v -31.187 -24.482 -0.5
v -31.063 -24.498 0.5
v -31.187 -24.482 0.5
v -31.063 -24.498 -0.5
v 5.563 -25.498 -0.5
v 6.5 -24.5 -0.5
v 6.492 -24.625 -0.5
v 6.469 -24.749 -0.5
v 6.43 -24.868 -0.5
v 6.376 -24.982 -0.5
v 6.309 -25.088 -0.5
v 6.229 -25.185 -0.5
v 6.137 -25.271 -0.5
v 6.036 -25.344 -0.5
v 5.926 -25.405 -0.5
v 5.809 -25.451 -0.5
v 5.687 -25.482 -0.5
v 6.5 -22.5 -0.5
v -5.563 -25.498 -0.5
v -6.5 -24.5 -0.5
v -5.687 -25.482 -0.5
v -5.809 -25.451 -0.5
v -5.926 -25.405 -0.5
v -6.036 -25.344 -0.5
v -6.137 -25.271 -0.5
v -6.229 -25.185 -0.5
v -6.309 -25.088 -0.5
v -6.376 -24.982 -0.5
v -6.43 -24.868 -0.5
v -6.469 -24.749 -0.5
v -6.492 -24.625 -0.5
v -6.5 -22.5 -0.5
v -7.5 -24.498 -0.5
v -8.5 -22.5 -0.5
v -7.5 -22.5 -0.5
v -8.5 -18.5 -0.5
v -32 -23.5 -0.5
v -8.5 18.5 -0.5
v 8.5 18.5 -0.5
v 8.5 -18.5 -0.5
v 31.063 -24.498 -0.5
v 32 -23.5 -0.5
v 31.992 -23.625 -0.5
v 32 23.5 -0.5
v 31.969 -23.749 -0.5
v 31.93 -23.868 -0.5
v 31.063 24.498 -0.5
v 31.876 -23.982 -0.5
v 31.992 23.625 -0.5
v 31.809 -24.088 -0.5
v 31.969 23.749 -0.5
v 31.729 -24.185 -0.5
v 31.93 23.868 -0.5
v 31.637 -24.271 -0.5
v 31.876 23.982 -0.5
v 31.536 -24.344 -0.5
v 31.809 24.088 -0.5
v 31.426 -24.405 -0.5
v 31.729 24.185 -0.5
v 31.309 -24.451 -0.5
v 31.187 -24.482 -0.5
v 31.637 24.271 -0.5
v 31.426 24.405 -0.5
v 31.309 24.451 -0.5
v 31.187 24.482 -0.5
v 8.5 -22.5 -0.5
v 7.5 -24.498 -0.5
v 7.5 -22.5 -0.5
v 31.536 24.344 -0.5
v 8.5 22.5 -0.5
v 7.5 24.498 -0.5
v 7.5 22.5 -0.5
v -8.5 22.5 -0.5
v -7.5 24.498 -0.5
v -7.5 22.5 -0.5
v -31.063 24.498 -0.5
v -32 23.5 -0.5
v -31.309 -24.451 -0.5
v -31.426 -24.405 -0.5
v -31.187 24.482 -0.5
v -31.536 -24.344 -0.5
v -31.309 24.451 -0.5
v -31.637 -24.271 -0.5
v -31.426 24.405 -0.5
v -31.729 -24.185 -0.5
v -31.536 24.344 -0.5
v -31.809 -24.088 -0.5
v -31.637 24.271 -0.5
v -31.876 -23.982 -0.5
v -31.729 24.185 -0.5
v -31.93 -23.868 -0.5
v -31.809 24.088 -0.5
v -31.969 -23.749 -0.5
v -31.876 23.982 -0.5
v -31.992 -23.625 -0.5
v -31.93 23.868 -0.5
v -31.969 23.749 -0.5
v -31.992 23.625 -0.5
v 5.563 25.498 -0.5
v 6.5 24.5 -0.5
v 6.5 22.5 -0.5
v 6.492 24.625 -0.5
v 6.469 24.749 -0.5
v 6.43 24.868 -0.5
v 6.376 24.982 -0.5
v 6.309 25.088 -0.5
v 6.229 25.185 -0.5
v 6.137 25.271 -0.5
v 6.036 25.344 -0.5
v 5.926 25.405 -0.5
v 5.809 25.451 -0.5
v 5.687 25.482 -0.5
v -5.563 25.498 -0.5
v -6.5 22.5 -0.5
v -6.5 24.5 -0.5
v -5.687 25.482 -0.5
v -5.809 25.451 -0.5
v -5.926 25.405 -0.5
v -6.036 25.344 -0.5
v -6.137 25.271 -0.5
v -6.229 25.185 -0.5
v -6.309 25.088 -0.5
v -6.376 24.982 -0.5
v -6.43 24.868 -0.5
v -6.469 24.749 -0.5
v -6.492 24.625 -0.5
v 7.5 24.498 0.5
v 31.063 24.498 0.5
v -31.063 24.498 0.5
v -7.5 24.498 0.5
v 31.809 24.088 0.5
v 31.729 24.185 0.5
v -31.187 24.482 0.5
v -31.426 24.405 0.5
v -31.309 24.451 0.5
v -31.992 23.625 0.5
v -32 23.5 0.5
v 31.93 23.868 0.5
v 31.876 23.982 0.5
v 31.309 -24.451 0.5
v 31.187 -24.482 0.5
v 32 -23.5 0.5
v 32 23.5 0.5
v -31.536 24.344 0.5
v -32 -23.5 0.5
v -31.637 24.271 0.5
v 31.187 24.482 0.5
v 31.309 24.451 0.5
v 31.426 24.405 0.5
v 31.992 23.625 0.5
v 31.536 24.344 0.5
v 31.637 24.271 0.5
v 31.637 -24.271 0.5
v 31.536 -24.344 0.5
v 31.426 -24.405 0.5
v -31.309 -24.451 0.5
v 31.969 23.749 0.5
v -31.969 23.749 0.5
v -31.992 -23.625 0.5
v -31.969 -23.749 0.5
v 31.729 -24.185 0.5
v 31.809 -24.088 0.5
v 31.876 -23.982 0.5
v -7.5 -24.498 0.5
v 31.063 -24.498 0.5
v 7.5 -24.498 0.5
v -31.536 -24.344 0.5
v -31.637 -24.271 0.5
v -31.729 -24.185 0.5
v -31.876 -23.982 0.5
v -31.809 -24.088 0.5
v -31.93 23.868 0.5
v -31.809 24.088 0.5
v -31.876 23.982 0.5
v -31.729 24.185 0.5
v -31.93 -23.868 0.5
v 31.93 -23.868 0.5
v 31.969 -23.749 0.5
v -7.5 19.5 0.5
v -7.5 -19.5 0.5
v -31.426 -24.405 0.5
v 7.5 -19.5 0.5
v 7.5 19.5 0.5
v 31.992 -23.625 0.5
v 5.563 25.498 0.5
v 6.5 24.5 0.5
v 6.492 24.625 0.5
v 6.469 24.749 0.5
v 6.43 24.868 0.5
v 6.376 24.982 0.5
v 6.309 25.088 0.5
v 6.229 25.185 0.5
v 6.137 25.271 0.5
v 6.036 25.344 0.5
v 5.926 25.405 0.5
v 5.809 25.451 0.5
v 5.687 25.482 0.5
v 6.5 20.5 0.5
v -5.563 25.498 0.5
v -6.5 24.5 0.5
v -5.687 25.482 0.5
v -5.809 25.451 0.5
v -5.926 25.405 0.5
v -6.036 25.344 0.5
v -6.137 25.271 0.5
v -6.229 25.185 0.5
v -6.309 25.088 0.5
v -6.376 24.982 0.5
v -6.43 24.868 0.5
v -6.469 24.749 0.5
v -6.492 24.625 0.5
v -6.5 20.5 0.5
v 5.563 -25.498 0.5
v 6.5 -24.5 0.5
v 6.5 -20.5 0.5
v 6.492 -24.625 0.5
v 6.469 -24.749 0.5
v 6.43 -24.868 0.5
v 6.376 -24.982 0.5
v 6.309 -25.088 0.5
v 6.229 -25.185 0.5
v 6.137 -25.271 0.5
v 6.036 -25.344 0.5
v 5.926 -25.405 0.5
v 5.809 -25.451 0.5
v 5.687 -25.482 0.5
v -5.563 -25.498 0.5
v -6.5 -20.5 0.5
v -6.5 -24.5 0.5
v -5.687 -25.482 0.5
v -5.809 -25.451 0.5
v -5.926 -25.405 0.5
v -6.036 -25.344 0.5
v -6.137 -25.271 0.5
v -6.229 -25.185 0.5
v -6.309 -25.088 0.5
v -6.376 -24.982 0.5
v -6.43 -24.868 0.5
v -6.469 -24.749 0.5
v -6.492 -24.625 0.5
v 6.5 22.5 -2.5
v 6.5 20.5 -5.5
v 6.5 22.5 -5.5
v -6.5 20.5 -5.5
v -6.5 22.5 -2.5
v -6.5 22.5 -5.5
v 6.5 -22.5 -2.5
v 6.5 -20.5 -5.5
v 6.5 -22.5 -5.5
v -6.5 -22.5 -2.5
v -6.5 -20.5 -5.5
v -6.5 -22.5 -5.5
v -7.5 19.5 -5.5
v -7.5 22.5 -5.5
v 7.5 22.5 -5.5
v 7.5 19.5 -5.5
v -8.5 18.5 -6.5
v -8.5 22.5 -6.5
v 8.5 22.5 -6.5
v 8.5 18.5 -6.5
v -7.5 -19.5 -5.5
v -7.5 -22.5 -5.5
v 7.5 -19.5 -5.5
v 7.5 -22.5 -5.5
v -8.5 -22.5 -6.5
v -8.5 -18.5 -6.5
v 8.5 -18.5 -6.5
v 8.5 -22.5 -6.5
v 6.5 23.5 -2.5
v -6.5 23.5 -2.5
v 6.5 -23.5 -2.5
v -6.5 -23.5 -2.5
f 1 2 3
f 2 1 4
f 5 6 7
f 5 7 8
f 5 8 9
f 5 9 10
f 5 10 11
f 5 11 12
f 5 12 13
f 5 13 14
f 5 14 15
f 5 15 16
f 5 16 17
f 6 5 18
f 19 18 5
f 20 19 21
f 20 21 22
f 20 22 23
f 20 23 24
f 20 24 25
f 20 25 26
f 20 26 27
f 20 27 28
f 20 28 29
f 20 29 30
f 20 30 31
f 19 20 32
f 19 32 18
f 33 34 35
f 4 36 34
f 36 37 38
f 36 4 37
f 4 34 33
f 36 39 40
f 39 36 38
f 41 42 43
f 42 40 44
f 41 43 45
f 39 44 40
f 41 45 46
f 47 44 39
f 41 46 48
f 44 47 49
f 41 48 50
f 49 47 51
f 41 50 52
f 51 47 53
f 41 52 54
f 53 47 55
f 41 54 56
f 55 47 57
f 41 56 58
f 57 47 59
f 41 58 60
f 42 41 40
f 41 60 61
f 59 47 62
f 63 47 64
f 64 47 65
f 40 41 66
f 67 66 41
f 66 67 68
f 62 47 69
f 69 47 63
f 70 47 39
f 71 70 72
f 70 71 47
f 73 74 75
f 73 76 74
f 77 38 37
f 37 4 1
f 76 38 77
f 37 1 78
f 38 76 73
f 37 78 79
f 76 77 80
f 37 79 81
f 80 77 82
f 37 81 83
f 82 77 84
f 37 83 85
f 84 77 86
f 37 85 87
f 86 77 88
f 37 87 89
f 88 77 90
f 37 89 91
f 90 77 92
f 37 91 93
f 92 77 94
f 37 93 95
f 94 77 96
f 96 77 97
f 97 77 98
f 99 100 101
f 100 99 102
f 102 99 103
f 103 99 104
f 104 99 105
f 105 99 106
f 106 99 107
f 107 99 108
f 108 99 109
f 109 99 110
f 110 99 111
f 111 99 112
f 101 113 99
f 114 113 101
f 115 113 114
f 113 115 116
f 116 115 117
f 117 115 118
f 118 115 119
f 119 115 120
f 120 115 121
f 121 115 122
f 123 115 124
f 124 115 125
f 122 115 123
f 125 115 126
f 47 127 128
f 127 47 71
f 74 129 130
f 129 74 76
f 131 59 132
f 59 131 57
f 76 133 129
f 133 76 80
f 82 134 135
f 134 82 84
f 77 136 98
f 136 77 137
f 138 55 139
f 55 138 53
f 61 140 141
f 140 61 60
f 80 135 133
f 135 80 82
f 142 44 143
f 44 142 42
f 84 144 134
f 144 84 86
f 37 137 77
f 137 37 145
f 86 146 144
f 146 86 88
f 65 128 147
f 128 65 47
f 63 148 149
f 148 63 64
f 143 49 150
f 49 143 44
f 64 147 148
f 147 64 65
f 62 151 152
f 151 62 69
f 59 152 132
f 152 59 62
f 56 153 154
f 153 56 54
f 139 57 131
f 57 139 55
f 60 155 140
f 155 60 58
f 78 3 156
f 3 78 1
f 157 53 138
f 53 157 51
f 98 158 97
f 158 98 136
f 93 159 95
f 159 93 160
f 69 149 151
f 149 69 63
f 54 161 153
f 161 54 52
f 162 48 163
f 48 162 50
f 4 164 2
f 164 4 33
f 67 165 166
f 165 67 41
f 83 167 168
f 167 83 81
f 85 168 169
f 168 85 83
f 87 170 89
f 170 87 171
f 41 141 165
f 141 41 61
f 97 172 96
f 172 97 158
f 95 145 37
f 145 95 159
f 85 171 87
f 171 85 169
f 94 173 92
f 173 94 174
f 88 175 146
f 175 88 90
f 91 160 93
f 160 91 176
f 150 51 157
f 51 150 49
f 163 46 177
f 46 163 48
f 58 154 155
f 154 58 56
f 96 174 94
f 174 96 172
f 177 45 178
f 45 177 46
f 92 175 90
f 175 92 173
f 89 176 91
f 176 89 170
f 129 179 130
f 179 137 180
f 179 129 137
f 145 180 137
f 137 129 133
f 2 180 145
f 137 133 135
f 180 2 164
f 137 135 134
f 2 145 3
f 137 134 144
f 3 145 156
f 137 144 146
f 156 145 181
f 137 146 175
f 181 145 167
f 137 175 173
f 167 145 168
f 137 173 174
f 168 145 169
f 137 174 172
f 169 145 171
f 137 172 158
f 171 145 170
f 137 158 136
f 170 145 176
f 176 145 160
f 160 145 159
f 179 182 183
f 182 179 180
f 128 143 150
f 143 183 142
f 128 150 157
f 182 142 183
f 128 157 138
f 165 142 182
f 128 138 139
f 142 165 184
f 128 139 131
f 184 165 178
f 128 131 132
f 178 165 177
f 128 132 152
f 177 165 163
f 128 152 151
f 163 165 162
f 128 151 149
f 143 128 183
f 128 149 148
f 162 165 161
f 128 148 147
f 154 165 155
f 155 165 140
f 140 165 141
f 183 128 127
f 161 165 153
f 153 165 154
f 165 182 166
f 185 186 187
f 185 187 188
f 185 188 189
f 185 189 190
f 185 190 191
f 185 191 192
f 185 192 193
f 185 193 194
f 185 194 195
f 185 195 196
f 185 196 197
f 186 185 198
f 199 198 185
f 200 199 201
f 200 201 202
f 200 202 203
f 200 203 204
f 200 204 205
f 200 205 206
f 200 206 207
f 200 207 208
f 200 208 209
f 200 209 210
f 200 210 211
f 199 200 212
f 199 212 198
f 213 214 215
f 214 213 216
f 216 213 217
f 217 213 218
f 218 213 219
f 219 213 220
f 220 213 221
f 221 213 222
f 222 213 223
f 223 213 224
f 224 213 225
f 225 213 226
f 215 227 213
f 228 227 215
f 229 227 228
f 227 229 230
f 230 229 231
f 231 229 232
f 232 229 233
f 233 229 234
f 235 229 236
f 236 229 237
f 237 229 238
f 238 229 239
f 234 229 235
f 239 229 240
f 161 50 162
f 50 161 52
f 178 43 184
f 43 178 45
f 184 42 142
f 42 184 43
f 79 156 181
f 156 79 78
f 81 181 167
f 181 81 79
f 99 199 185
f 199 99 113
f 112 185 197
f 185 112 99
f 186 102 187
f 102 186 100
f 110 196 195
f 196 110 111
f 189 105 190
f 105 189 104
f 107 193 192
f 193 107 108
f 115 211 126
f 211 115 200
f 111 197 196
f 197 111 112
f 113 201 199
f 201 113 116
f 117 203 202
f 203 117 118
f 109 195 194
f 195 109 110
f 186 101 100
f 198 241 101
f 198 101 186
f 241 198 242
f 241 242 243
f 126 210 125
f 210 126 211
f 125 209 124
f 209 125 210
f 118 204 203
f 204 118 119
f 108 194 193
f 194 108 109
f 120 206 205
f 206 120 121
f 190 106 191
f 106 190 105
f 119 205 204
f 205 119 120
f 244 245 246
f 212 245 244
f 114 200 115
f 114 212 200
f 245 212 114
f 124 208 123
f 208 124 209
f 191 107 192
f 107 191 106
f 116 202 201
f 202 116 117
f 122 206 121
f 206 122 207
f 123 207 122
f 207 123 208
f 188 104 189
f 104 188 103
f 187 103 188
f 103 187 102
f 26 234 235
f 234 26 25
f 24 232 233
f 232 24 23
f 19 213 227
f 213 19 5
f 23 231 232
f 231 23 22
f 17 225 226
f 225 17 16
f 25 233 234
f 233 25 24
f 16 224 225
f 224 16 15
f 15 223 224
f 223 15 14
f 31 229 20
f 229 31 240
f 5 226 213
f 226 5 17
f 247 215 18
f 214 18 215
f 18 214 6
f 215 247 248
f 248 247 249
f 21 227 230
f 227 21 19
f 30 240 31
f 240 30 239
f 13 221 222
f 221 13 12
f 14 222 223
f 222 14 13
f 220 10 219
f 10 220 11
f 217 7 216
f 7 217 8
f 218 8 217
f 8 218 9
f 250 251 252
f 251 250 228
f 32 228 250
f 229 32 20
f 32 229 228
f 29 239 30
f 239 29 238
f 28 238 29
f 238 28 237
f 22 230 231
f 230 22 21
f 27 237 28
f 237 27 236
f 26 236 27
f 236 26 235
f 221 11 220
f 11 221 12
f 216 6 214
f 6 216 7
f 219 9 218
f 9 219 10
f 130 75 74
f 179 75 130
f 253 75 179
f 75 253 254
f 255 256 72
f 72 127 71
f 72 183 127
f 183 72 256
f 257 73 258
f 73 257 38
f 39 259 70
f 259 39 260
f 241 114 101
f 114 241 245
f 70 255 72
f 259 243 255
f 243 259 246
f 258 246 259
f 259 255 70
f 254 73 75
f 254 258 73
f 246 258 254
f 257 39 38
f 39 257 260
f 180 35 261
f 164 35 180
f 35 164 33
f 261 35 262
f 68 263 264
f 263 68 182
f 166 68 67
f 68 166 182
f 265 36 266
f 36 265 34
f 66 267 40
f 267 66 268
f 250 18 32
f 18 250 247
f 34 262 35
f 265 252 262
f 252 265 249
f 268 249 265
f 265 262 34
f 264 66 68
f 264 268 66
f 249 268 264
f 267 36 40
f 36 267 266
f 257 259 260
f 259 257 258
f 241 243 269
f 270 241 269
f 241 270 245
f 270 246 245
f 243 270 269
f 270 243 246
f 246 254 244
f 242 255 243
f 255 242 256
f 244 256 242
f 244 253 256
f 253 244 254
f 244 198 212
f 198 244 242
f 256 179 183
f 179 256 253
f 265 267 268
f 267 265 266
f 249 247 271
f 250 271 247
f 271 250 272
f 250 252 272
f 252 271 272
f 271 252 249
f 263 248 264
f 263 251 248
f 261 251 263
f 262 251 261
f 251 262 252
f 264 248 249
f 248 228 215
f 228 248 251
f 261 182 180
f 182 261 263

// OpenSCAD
$fa = 0.5; // default minimum facet angle is now 0.5
$fs = 0.5; // default minimum facet size is now 0.5 
$fn = 50;

bay = [60,45];
lip = 2;
wall = 1;
box_wall = 1;

cap = [13, 4, 1];

module wedge(d = [1,1,1], center = false) {
    mov = center ? [-d[0]/2,-d[1]/2,0] : [0,0,d[2]]/2;
    
    translate(mov)
    linear_extrude(height = d[2], center=true)
    polygon([[0,0],[d[0],0],[0,d[1]]]);
}

module rounded_cube(d=[1,1,1], center = false, r = 1) {
    mov = center ? [-d[0]/2,-d[1]/2,0] : [0,0,d[2]]/2;
    
    translate(mov)
    hull() {
        translate([r,r,0]) cylinder(d[2], r = r, center = true);
        translate([d[0]-r,r,0]) cylinder(d[2], r = r, center = true);
        translate([r,d[1]-r,0]) cylinder(d[2], r = r, center = true);
        translate([d[0]-r,d[1]-r]) cylinder(d[2], r = r, center = true);
    }
}

d = [17,4,wall+6];
space = 1;

module box(solid=false) {
    rotate([0,180,0])
    difference() {
        union() {
            translate([0,0,d[2]/2]) cube(d, center = true);
            translate([-(d[0]-2*space-2*box_wall)/2,d[1]/2,cap[2]+2])
                rotate([90,0,90])
                    wedge([box_wall,d[2]-box_wall-cap[2]-2,d[0]-2*space-2*box_wall]);
            if (solid) {
                translate([0,-d[1]/2+space/2+box_wall,(d[2]-box_wall)/2-1]) 
                    cube([d[0]-2*box_wall,space,d[2]-box_wall+1], center = true);

                translate([d[0]/2-space/2-box_wall,
                          -space/2+d[1]/2-box_wall+lip,
                          (d[2]-box_wall)/2-1])
                    cube([space,d[1]+lip,d[2]-box_wall+1], center = true);
                translate([-d[0]/2+space/2+box_wall,
                          -space/2+d[1]/2-box_wall+lip,
                          (d[2]-box_wall)/2-1]) 
                    cube([space,d[1]+lip,d[2]-box_wall+1], center = true);
            }

        }
        if (!solid) {
            translate([0,-d[1]/2+space/2+box_wall,(d[2]-box_wall)/2]) 
                cube([d[0]-2*box_wall,space,d[2]-box_wall], center = true);
            translate([d[0]/2-space/2-box_wall,-space/2+d[1]/2-box_wall,(d[2]-box_wall)/2]) 
                cube([space,d[1]-box_wall,d[2]-box_wall], center = true);
            translate([-d[0]/2+space/2+box_wall,-space/2+d[1]/2-box_wall,(d[2]-box_wall)/2]) 
                cube([space,d[1]-box_wall,d[2]-box_wall], center = true);
        }
    }
}

module module_cover() render() {
    union() {
        difference() {
            union() {
                rounded_cube([bay[0]+2*lip, 
                              bay[1]+2*lip, 
                              wall], center=true);
                translate([0,bay[1]/2+lip-space,wall/2-cap[2]/2]) 
                    rounded_cube(cap, center = true);
                translate([0,-bay[1]/2-lip+space,wall/2-cap[2]/2]) 
                    rounded_cube(cap, center = true);
            }
            translate([0, bay[1]/2-d[1]/2, wall/2]) box(solid=true);
            mirror([0,1,0]) translate([0, bay[1]/2-d[1]/2, wall/2]) box(solid=true);
        }
    
        translate([0, bay[1]/2-d[1]/2,wall/2]) box();
        mirror([0,1,0]) translate([0, bay[1]/2-d[1]/2,wall/2]) box();
    }
}

module_cover();
